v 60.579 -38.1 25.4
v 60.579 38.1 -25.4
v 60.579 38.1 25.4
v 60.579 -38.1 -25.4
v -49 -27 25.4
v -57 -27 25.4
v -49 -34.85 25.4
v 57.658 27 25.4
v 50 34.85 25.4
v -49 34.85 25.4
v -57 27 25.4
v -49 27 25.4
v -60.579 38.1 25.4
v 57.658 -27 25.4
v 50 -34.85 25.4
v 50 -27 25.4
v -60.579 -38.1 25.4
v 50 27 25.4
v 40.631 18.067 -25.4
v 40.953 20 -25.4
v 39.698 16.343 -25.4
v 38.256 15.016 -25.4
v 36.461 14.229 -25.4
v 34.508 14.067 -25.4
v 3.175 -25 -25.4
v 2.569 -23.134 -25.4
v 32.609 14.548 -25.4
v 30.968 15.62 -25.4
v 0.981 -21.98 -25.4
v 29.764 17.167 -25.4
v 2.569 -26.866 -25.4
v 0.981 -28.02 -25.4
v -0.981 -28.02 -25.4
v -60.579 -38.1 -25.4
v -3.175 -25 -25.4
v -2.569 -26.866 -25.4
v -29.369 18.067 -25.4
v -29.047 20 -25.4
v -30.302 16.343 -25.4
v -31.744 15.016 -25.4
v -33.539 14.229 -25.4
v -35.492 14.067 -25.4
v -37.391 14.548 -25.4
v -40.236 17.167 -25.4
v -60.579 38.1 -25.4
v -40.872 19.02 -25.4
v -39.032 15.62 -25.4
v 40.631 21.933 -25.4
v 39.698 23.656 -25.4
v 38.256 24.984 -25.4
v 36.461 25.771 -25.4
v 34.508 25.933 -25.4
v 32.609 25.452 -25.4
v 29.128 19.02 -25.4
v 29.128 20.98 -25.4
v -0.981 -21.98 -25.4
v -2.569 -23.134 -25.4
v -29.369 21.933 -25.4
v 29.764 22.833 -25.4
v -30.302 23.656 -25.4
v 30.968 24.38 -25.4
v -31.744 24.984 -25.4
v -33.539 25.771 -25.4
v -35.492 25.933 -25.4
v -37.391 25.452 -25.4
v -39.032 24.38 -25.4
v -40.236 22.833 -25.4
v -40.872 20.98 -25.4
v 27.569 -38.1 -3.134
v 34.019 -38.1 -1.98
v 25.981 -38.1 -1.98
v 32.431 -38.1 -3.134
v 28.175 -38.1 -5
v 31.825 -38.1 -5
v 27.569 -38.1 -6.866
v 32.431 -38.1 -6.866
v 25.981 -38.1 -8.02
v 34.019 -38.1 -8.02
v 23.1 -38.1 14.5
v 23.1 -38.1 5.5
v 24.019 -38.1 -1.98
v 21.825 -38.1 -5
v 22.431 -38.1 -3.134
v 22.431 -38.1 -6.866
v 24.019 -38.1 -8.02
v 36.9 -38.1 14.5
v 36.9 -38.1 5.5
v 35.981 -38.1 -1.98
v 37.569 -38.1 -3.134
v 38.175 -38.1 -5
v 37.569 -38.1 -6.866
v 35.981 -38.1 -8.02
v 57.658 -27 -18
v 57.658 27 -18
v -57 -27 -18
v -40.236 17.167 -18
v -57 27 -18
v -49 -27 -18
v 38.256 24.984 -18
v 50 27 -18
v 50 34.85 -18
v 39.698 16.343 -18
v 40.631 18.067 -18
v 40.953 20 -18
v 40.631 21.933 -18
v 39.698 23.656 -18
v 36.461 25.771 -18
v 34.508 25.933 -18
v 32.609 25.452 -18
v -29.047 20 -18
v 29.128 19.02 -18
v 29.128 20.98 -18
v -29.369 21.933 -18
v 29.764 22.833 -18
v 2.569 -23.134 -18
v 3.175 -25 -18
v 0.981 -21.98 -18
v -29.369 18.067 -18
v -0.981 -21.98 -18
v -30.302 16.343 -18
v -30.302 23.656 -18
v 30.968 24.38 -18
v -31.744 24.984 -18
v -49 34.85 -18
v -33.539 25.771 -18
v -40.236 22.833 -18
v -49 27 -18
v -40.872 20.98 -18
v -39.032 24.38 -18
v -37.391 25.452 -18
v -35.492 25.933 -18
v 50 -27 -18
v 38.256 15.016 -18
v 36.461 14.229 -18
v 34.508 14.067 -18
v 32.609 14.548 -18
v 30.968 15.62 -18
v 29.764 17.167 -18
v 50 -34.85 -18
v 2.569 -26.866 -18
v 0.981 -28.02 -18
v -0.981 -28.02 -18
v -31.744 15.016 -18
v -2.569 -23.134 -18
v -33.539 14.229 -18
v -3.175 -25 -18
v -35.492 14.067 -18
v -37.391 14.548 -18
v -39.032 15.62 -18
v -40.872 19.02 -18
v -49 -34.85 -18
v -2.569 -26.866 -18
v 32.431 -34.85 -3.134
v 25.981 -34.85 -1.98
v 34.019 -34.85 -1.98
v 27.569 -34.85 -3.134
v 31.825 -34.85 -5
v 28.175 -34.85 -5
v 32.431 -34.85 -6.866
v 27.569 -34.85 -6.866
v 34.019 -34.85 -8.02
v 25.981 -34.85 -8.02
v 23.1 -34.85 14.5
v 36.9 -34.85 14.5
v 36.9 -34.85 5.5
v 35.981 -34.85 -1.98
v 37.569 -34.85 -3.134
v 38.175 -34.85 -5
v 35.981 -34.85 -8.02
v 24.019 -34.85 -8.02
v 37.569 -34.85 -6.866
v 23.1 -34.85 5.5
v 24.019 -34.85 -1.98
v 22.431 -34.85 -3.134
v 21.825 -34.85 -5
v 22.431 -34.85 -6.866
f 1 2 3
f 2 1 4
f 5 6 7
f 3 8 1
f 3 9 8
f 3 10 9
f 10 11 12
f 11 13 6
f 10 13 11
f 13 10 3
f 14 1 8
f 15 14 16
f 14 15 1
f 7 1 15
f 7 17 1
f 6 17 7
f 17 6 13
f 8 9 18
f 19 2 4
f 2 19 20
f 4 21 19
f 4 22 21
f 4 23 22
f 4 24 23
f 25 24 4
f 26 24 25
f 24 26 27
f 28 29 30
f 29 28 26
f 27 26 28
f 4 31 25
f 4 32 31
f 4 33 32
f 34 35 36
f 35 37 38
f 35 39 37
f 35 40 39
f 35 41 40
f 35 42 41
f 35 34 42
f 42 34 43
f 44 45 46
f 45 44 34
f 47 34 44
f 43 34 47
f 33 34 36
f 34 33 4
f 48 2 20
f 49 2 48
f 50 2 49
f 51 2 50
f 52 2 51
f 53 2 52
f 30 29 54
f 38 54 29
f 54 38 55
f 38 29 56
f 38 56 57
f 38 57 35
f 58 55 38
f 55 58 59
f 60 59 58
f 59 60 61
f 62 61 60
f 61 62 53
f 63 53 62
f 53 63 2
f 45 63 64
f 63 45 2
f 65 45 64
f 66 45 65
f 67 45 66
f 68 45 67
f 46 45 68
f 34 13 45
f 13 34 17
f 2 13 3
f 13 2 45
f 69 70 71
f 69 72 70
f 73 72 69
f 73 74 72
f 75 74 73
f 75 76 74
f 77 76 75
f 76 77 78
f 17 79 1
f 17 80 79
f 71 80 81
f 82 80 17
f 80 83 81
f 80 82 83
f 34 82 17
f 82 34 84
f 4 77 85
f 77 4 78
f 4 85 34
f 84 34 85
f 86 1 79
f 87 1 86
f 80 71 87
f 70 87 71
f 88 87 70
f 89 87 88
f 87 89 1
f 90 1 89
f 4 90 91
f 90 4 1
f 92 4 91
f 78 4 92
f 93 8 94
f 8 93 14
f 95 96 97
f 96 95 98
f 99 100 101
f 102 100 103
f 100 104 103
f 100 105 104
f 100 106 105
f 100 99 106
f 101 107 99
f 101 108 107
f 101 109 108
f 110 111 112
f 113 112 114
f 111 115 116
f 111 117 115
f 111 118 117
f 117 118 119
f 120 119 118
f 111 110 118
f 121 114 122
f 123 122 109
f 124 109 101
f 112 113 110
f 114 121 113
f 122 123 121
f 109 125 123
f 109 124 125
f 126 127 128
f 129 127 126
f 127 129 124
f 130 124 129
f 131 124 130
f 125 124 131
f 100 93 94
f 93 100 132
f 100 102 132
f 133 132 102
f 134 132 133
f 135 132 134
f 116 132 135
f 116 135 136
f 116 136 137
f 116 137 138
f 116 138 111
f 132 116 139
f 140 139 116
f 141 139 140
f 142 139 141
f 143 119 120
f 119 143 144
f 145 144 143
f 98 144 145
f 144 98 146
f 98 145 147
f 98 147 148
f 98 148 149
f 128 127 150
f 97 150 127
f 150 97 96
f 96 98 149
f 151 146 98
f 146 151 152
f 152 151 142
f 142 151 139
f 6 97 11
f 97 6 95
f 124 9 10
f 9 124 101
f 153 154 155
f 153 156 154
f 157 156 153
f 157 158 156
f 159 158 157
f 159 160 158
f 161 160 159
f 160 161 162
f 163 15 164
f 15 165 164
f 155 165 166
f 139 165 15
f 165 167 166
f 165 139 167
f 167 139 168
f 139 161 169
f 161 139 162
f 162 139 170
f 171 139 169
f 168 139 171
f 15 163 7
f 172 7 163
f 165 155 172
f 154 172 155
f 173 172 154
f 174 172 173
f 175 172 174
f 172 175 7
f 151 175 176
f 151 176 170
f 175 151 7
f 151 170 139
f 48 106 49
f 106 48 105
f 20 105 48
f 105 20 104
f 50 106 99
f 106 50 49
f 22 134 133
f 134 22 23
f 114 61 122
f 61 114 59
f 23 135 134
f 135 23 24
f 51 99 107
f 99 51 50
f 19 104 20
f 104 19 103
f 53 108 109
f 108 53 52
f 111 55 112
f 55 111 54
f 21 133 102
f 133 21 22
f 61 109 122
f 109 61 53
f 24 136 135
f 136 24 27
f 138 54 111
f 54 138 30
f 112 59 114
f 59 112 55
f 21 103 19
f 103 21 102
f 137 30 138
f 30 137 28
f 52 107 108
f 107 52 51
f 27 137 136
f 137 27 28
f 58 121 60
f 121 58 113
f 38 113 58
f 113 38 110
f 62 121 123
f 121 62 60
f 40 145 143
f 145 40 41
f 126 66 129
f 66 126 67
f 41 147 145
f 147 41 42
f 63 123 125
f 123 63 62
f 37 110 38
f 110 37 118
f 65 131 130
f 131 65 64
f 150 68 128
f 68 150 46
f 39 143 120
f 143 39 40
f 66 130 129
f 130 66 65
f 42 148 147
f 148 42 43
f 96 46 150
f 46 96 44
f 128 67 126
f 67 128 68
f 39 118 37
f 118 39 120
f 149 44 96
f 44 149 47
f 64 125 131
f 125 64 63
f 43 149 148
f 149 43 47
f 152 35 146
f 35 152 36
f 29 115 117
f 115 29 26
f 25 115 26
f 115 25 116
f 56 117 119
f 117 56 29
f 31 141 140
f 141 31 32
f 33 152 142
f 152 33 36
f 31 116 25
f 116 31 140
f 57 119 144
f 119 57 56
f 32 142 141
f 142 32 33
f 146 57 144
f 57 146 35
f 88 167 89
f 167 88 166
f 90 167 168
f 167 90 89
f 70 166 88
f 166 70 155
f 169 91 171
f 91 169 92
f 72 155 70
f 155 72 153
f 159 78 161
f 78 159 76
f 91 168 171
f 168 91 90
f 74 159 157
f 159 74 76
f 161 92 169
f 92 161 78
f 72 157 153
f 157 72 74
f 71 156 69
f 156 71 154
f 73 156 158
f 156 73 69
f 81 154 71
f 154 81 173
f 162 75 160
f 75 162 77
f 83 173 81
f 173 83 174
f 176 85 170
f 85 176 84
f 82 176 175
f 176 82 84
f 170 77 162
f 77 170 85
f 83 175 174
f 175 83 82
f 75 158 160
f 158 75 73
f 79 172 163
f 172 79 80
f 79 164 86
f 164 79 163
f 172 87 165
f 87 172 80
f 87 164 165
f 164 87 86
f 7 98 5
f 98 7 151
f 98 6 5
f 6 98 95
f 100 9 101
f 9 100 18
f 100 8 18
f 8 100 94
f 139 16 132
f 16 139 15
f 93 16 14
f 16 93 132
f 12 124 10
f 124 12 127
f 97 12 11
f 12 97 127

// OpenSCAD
union()
{

	difference()
	{
		// box: 4.77" x 3" x 2"
		cube([121.158,76.2,50.8], center=true);
		translate([-57,-34.85,-18]) cube([114.658,69.7,44.3]);
		// 15/32" stomp switches
		translate([35, 20, 0]) cylinder(100, 5.95315, 5.95315, center=true);
		translate([-35, 20, 0]) cylinder(100, 5.95315, 5.95315, center=true);
		// 1/4" for Activity LED
		translate([0, -25, 0]) cylinder(51, 3.175, 3.175, center=true);
	
		// Originally placed these on the face but the side seems better. See below.
		//translate([25, -20, 0]) cylinder(51, 3.175, 3.175, center=true);
		//translate([35, -20, 0]) cylinder(51, 3.175, 3.175, center=true);
		
		// 1/4" for connectivity LED and momentary button
	 	translate([35, -40, -5]) rotate([90,0,0]) cylinder(51, 3.175, 3.175, center=true);
	 	translate([25, -40, -5]) rotate([90,0,0]) cylinder(51, 3.175, 3.175, center=true);
		// rectangle for rocker switch
		translate([30, -40, 10]) rotate([90,0,0]) cube([13.8,9,15], center=true);
	}

	// ?? Mounting posts for screws to secure bottom plate ??
	translate([-53,-31, 0]) cube([8,8,50.8], center=true);
	translate([54,31, 0]) cube([8,8,50.8], center=true);
	translate([54,-31, 0]) cube([8,8,50.8], center=true);
	translate([-53,31, 0]) cube([8,8,50.8], center=true);
}
